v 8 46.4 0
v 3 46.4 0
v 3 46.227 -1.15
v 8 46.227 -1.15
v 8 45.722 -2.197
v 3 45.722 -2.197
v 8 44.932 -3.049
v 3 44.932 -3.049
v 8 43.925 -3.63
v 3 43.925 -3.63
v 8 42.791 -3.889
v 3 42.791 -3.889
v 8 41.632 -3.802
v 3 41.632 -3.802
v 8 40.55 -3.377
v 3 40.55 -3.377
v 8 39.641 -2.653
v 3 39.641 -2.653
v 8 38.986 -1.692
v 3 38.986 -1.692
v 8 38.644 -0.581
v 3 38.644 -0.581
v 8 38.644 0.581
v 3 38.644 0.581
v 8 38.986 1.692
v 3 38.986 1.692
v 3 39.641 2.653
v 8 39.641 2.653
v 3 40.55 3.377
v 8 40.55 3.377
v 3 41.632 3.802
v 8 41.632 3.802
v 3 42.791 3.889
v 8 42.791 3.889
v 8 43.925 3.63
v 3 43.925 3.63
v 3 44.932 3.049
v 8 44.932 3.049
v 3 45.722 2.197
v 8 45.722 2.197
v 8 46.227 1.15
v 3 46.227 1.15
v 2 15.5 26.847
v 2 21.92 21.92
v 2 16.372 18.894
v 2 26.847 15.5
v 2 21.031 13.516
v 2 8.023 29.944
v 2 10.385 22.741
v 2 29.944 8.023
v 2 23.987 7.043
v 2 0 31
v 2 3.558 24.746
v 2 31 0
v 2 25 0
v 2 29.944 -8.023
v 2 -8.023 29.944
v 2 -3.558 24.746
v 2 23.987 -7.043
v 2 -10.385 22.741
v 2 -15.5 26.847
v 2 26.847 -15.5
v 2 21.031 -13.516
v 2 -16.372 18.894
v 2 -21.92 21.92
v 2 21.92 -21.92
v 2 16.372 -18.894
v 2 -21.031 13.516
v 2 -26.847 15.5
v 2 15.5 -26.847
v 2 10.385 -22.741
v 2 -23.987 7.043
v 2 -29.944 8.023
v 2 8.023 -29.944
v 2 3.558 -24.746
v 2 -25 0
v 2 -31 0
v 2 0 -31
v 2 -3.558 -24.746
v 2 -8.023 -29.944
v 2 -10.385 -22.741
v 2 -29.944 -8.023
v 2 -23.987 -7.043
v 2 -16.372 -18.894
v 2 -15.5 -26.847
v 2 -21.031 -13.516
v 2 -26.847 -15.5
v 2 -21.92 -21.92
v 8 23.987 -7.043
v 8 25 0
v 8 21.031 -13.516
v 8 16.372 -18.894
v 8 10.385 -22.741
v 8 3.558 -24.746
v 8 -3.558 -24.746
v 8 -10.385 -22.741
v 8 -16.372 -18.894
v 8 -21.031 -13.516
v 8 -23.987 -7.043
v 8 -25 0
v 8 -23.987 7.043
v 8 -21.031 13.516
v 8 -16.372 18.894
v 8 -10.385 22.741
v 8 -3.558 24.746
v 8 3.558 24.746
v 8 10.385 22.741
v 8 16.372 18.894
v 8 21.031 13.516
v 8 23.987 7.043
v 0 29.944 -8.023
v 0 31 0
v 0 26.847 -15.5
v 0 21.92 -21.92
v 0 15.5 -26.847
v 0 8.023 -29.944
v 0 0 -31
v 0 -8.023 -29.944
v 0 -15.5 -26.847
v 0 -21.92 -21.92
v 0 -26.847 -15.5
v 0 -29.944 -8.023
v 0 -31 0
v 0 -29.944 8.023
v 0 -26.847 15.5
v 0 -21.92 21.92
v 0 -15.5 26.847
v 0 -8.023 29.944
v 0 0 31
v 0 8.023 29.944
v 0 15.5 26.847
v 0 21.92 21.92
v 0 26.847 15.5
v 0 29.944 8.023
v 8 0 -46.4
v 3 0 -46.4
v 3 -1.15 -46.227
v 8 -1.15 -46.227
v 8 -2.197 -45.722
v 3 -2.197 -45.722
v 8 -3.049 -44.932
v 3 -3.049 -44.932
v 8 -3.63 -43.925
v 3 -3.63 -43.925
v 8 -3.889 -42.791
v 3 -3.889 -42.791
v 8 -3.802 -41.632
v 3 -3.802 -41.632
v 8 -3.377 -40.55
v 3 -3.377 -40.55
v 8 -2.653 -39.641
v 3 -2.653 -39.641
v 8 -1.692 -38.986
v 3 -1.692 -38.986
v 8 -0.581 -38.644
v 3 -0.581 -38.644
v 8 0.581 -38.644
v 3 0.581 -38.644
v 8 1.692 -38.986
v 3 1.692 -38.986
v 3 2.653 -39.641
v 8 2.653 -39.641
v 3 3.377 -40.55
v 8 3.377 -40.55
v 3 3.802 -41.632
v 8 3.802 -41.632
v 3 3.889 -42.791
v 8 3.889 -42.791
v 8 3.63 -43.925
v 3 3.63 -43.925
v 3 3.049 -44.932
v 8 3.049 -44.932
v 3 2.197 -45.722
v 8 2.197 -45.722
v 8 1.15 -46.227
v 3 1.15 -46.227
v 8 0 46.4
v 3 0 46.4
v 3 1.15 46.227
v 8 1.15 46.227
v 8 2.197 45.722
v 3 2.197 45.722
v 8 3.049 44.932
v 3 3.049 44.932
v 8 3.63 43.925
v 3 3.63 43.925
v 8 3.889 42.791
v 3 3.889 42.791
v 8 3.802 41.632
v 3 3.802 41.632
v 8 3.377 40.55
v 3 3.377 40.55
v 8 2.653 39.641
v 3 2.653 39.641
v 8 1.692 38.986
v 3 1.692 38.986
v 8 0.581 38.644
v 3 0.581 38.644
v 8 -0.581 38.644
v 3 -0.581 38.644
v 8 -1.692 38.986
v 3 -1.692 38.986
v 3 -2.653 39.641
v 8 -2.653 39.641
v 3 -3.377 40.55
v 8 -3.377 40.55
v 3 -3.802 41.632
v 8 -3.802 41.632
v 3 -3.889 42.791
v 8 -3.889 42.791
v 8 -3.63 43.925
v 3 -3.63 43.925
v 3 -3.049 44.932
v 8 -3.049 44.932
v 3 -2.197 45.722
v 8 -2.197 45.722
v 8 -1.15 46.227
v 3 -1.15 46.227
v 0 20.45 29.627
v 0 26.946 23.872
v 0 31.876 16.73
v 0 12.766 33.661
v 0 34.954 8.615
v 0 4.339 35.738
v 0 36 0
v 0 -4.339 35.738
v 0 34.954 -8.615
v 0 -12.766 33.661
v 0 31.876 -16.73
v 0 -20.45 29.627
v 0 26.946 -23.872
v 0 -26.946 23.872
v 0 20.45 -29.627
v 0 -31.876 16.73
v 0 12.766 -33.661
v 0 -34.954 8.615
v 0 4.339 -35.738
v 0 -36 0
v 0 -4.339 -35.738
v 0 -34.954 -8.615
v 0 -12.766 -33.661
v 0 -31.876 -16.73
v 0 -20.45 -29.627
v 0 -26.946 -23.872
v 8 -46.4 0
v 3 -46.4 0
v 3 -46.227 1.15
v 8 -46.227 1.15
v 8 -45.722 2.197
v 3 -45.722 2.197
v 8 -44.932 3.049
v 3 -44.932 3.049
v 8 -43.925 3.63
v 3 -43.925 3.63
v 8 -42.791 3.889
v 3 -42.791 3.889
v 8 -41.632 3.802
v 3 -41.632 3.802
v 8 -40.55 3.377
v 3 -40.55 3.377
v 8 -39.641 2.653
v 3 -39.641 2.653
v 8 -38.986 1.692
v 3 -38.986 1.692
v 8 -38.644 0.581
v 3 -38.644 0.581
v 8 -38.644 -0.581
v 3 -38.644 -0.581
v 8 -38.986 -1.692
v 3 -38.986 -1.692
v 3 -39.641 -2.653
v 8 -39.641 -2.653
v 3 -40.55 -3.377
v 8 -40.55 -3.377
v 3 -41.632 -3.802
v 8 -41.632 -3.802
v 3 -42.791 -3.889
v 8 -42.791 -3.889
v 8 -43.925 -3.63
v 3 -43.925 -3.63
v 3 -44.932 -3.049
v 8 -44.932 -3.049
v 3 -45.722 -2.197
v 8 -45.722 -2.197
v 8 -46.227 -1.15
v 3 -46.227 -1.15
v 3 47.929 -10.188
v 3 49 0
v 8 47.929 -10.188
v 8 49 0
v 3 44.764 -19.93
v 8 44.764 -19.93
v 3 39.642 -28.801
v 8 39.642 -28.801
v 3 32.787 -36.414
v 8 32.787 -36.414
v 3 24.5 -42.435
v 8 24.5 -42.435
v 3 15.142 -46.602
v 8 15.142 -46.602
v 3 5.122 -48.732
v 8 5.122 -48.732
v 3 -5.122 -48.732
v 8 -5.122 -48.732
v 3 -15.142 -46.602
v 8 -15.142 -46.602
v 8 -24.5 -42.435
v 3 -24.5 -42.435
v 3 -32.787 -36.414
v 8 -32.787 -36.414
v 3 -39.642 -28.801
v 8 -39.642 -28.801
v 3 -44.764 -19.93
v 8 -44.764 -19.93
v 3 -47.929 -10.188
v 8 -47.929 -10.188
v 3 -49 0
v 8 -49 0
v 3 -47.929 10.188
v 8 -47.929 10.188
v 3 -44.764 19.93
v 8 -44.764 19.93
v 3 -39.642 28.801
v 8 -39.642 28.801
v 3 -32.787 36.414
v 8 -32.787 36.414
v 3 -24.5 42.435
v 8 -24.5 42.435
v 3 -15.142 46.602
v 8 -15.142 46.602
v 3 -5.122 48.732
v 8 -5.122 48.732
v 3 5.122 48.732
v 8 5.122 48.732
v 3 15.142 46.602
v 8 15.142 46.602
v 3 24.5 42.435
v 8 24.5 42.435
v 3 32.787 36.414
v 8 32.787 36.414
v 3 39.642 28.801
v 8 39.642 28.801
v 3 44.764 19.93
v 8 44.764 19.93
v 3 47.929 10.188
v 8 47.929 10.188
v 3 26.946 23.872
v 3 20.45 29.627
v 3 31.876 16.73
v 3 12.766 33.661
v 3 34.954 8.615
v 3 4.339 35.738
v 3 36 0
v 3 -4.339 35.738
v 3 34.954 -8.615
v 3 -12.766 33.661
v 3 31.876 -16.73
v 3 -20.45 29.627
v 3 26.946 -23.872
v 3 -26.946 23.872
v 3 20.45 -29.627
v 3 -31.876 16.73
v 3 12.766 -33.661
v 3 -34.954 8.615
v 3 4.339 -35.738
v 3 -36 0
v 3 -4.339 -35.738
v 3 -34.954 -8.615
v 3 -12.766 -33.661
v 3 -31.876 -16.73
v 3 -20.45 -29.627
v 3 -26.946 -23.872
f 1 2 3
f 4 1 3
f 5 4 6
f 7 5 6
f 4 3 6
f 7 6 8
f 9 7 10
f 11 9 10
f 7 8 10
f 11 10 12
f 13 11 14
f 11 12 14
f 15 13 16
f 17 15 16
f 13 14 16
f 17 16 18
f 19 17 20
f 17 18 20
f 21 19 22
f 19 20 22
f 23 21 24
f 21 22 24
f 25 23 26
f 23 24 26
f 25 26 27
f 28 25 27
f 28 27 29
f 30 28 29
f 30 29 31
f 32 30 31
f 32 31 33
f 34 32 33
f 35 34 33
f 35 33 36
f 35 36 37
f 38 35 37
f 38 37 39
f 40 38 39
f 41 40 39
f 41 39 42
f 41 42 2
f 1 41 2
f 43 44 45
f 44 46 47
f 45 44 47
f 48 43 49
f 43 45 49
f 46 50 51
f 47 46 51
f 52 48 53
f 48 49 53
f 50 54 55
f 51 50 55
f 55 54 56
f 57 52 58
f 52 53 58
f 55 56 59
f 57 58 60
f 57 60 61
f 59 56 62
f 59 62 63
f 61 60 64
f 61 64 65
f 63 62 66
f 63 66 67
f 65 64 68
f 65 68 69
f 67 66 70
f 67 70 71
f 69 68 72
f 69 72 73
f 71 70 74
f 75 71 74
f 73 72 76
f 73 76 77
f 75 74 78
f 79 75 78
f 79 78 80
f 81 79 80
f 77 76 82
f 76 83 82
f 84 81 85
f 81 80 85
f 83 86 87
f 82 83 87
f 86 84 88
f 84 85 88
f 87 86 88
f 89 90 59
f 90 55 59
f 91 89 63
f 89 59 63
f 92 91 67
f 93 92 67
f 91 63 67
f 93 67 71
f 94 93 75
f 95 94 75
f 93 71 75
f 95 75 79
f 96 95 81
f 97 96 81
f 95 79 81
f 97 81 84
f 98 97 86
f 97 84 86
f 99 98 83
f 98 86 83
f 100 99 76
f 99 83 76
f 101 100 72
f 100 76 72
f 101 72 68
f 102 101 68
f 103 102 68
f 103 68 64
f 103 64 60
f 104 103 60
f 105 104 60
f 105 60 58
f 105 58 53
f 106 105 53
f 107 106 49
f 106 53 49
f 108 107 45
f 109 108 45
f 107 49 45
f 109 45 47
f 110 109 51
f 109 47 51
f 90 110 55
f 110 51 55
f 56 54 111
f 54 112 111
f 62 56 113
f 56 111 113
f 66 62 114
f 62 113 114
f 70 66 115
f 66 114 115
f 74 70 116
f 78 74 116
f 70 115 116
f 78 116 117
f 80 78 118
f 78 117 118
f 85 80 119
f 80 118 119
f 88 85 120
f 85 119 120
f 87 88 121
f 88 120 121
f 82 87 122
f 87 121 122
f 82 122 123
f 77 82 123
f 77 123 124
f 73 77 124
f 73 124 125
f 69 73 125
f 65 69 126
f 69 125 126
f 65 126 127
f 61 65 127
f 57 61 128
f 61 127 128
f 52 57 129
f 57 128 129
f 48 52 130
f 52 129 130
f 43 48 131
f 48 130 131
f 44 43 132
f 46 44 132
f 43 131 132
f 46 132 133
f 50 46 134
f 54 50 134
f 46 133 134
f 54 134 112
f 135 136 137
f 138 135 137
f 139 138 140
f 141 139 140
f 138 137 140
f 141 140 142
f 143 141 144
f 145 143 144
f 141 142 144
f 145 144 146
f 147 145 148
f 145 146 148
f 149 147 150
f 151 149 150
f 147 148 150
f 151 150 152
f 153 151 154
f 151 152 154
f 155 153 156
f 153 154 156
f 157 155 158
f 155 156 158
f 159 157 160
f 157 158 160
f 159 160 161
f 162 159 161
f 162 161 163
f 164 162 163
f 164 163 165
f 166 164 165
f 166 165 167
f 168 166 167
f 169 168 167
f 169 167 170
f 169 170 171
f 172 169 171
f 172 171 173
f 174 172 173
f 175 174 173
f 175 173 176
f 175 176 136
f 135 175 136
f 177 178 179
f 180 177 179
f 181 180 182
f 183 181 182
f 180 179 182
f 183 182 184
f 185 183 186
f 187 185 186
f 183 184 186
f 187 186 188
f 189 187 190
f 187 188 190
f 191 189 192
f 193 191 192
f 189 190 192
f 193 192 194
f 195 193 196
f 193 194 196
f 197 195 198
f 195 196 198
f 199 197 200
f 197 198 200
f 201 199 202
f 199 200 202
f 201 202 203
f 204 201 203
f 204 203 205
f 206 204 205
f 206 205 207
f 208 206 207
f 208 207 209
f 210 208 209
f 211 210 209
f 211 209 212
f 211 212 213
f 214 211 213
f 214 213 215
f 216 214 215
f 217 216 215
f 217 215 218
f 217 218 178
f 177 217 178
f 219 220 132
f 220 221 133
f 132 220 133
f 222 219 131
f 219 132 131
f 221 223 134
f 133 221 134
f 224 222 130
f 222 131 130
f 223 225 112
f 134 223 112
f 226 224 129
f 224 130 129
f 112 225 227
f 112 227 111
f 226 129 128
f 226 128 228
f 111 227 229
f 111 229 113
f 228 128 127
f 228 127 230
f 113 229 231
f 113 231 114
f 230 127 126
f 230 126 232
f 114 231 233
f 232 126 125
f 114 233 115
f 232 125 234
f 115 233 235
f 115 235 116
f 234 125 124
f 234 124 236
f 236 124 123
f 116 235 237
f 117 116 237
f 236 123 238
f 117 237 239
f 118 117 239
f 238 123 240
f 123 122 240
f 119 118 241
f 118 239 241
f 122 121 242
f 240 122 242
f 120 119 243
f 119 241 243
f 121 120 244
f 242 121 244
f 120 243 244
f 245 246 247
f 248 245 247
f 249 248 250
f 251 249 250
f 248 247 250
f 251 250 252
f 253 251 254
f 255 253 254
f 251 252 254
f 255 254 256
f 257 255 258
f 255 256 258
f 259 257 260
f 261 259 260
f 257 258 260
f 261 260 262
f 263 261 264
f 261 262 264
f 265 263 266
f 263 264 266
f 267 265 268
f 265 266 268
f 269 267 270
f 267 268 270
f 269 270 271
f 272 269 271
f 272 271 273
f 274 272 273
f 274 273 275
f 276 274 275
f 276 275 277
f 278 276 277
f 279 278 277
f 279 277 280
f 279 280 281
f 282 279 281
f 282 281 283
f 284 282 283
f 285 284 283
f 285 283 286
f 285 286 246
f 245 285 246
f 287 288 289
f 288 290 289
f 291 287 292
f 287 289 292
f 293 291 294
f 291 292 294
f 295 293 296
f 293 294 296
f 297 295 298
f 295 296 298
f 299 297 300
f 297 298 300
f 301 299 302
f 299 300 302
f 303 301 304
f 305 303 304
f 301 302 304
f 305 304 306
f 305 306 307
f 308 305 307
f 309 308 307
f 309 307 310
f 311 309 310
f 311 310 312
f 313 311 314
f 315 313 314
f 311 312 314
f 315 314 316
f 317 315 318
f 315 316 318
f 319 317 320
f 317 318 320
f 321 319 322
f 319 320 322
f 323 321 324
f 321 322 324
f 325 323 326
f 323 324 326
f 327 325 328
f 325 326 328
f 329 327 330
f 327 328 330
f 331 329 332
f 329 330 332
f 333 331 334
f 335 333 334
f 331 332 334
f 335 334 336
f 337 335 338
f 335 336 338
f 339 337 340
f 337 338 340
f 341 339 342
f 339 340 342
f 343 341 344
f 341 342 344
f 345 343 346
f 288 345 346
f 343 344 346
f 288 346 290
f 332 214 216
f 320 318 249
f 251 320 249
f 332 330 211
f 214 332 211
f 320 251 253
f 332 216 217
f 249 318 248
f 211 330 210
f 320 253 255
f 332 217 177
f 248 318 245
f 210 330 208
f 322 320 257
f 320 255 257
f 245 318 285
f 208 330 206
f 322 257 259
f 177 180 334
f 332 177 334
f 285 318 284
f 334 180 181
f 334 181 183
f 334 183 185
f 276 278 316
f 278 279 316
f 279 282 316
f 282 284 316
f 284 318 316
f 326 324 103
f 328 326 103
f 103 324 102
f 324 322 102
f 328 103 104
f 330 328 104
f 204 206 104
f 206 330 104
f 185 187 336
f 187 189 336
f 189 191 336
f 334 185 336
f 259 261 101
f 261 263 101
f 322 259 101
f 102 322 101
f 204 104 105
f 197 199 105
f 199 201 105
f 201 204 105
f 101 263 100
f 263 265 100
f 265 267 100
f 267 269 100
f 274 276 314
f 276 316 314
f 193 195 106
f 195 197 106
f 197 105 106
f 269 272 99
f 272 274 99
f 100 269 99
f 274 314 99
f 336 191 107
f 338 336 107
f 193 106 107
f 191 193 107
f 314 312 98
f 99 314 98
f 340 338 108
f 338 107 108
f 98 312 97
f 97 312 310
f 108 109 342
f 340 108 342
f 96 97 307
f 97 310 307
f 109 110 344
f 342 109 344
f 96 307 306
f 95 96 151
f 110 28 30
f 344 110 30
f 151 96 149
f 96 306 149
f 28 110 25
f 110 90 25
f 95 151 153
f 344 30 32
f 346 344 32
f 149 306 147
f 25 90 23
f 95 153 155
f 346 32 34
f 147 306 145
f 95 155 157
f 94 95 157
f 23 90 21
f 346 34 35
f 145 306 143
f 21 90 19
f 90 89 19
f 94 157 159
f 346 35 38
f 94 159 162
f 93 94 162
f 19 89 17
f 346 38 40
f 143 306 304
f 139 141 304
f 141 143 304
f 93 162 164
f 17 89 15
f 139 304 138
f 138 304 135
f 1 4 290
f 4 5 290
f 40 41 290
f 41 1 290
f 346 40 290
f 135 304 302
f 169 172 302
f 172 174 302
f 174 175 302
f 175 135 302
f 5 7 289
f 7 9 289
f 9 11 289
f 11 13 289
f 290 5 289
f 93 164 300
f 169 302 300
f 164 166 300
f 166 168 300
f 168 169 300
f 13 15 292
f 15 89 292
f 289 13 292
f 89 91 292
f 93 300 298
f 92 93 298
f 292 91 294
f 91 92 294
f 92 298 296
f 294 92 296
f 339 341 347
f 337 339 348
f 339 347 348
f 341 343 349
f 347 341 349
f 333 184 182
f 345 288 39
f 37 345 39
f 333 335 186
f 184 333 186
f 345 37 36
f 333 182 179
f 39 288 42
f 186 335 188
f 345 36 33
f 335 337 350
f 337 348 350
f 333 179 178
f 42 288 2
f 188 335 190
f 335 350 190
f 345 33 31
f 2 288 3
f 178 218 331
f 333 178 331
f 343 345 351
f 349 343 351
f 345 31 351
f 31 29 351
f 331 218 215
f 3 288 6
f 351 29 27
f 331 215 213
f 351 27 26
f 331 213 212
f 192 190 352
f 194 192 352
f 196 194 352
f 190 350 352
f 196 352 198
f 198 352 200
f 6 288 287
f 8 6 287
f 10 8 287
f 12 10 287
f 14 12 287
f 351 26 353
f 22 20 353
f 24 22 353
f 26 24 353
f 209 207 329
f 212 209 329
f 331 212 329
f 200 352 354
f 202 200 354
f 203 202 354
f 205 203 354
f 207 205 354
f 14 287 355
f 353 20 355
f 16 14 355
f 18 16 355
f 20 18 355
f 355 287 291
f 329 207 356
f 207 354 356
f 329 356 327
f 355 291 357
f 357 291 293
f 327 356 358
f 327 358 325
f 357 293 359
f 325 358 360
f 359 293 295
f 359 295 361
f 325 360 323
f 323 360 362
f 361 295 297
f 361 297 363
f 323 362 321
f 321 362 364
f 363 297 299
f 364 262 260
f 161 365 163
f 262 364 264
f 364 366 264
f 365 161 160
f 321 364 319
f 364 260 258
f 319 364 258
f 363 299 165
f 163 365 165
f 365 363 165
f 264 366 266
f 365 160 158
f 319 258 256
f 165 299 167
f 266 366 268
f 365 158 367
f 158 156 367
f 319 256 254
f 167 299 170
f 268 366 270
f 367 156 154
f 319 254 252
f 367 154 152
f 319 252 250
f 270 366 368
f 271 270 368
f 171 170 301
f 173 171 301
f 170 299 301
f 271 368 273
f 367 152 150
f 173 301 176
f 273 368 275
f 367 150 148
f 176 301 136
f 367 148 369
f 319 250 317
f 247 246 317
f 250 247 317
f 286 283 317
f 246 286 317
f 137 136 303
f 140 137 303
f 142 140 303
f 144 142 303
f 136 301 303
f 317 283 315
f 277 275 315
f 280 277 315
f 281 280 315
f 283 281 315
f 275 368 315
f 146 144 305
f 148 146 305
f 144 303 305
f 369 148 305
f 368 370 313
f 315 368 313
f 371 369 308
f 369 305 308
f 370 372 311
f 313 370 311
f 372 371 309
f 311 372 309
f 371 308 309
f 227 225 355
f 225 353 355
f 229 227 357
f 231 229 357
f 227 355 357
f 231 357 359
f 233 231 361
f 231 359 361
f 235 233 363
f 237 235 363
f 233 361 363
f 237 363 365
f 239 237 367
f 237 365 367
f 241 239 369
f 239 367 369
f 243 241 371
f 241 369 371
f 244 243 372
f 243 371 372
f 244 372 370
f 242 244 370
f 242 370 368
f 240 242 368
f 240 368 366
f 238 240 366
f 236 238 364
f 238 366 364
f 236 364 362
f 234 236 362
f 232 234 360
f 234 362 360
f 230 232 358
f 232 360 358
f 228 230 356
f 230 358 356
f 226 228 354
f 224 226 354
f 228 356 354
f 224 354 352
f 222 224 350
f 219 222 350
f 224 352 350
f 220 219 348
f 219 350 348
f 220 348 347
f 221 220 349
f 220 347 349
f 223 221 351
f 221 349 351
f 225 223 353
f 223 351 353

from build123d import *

# Parameters (mm, degrees)
SKETCH3_R          = 3.9
CUT_EXTRUDE1_DEPTH = 10
CIRPATTERN1_COUNT  = 4


with BuildPart() as part:
    # Sketch1 → Revolve1 (revolve)
    with BuildSketch(Plane.XY):
        Polygon((0, 31), (0, 36), (3, 36), (3, 49), (8, 49), (8, 25), (2, 25), (2, 31), align=None)
    revolve(axis=Axis((0, 0, 0), (-1, 0, 0)))

    # Sketch3 → Cut-Extrude1 (cut)
    with BuildSketch(Plane.ZY.offset(-3)):
        with Locations((42.5, 0)):
            Circle(SKETCH3_R)
    cut_extrude1 = extrude(amount=-CUT_EXTRUDE1_DEPTH, mode=Mode.SUBTRACT)

    # CirPattern1: Cut-Extrude1 ×4 about axis
    cirpattern1_axis = Axis((0, 0, 0), (1, 0, 0))
    for i in range(1, CIRPATTERN1_COUNT):
        add(cut_extrude1.rotate(cirpattern1_axis, i * 360 / CIRPATTERN1_COUNT), mode=Mode.SUBTRACT)


solid = part.part
